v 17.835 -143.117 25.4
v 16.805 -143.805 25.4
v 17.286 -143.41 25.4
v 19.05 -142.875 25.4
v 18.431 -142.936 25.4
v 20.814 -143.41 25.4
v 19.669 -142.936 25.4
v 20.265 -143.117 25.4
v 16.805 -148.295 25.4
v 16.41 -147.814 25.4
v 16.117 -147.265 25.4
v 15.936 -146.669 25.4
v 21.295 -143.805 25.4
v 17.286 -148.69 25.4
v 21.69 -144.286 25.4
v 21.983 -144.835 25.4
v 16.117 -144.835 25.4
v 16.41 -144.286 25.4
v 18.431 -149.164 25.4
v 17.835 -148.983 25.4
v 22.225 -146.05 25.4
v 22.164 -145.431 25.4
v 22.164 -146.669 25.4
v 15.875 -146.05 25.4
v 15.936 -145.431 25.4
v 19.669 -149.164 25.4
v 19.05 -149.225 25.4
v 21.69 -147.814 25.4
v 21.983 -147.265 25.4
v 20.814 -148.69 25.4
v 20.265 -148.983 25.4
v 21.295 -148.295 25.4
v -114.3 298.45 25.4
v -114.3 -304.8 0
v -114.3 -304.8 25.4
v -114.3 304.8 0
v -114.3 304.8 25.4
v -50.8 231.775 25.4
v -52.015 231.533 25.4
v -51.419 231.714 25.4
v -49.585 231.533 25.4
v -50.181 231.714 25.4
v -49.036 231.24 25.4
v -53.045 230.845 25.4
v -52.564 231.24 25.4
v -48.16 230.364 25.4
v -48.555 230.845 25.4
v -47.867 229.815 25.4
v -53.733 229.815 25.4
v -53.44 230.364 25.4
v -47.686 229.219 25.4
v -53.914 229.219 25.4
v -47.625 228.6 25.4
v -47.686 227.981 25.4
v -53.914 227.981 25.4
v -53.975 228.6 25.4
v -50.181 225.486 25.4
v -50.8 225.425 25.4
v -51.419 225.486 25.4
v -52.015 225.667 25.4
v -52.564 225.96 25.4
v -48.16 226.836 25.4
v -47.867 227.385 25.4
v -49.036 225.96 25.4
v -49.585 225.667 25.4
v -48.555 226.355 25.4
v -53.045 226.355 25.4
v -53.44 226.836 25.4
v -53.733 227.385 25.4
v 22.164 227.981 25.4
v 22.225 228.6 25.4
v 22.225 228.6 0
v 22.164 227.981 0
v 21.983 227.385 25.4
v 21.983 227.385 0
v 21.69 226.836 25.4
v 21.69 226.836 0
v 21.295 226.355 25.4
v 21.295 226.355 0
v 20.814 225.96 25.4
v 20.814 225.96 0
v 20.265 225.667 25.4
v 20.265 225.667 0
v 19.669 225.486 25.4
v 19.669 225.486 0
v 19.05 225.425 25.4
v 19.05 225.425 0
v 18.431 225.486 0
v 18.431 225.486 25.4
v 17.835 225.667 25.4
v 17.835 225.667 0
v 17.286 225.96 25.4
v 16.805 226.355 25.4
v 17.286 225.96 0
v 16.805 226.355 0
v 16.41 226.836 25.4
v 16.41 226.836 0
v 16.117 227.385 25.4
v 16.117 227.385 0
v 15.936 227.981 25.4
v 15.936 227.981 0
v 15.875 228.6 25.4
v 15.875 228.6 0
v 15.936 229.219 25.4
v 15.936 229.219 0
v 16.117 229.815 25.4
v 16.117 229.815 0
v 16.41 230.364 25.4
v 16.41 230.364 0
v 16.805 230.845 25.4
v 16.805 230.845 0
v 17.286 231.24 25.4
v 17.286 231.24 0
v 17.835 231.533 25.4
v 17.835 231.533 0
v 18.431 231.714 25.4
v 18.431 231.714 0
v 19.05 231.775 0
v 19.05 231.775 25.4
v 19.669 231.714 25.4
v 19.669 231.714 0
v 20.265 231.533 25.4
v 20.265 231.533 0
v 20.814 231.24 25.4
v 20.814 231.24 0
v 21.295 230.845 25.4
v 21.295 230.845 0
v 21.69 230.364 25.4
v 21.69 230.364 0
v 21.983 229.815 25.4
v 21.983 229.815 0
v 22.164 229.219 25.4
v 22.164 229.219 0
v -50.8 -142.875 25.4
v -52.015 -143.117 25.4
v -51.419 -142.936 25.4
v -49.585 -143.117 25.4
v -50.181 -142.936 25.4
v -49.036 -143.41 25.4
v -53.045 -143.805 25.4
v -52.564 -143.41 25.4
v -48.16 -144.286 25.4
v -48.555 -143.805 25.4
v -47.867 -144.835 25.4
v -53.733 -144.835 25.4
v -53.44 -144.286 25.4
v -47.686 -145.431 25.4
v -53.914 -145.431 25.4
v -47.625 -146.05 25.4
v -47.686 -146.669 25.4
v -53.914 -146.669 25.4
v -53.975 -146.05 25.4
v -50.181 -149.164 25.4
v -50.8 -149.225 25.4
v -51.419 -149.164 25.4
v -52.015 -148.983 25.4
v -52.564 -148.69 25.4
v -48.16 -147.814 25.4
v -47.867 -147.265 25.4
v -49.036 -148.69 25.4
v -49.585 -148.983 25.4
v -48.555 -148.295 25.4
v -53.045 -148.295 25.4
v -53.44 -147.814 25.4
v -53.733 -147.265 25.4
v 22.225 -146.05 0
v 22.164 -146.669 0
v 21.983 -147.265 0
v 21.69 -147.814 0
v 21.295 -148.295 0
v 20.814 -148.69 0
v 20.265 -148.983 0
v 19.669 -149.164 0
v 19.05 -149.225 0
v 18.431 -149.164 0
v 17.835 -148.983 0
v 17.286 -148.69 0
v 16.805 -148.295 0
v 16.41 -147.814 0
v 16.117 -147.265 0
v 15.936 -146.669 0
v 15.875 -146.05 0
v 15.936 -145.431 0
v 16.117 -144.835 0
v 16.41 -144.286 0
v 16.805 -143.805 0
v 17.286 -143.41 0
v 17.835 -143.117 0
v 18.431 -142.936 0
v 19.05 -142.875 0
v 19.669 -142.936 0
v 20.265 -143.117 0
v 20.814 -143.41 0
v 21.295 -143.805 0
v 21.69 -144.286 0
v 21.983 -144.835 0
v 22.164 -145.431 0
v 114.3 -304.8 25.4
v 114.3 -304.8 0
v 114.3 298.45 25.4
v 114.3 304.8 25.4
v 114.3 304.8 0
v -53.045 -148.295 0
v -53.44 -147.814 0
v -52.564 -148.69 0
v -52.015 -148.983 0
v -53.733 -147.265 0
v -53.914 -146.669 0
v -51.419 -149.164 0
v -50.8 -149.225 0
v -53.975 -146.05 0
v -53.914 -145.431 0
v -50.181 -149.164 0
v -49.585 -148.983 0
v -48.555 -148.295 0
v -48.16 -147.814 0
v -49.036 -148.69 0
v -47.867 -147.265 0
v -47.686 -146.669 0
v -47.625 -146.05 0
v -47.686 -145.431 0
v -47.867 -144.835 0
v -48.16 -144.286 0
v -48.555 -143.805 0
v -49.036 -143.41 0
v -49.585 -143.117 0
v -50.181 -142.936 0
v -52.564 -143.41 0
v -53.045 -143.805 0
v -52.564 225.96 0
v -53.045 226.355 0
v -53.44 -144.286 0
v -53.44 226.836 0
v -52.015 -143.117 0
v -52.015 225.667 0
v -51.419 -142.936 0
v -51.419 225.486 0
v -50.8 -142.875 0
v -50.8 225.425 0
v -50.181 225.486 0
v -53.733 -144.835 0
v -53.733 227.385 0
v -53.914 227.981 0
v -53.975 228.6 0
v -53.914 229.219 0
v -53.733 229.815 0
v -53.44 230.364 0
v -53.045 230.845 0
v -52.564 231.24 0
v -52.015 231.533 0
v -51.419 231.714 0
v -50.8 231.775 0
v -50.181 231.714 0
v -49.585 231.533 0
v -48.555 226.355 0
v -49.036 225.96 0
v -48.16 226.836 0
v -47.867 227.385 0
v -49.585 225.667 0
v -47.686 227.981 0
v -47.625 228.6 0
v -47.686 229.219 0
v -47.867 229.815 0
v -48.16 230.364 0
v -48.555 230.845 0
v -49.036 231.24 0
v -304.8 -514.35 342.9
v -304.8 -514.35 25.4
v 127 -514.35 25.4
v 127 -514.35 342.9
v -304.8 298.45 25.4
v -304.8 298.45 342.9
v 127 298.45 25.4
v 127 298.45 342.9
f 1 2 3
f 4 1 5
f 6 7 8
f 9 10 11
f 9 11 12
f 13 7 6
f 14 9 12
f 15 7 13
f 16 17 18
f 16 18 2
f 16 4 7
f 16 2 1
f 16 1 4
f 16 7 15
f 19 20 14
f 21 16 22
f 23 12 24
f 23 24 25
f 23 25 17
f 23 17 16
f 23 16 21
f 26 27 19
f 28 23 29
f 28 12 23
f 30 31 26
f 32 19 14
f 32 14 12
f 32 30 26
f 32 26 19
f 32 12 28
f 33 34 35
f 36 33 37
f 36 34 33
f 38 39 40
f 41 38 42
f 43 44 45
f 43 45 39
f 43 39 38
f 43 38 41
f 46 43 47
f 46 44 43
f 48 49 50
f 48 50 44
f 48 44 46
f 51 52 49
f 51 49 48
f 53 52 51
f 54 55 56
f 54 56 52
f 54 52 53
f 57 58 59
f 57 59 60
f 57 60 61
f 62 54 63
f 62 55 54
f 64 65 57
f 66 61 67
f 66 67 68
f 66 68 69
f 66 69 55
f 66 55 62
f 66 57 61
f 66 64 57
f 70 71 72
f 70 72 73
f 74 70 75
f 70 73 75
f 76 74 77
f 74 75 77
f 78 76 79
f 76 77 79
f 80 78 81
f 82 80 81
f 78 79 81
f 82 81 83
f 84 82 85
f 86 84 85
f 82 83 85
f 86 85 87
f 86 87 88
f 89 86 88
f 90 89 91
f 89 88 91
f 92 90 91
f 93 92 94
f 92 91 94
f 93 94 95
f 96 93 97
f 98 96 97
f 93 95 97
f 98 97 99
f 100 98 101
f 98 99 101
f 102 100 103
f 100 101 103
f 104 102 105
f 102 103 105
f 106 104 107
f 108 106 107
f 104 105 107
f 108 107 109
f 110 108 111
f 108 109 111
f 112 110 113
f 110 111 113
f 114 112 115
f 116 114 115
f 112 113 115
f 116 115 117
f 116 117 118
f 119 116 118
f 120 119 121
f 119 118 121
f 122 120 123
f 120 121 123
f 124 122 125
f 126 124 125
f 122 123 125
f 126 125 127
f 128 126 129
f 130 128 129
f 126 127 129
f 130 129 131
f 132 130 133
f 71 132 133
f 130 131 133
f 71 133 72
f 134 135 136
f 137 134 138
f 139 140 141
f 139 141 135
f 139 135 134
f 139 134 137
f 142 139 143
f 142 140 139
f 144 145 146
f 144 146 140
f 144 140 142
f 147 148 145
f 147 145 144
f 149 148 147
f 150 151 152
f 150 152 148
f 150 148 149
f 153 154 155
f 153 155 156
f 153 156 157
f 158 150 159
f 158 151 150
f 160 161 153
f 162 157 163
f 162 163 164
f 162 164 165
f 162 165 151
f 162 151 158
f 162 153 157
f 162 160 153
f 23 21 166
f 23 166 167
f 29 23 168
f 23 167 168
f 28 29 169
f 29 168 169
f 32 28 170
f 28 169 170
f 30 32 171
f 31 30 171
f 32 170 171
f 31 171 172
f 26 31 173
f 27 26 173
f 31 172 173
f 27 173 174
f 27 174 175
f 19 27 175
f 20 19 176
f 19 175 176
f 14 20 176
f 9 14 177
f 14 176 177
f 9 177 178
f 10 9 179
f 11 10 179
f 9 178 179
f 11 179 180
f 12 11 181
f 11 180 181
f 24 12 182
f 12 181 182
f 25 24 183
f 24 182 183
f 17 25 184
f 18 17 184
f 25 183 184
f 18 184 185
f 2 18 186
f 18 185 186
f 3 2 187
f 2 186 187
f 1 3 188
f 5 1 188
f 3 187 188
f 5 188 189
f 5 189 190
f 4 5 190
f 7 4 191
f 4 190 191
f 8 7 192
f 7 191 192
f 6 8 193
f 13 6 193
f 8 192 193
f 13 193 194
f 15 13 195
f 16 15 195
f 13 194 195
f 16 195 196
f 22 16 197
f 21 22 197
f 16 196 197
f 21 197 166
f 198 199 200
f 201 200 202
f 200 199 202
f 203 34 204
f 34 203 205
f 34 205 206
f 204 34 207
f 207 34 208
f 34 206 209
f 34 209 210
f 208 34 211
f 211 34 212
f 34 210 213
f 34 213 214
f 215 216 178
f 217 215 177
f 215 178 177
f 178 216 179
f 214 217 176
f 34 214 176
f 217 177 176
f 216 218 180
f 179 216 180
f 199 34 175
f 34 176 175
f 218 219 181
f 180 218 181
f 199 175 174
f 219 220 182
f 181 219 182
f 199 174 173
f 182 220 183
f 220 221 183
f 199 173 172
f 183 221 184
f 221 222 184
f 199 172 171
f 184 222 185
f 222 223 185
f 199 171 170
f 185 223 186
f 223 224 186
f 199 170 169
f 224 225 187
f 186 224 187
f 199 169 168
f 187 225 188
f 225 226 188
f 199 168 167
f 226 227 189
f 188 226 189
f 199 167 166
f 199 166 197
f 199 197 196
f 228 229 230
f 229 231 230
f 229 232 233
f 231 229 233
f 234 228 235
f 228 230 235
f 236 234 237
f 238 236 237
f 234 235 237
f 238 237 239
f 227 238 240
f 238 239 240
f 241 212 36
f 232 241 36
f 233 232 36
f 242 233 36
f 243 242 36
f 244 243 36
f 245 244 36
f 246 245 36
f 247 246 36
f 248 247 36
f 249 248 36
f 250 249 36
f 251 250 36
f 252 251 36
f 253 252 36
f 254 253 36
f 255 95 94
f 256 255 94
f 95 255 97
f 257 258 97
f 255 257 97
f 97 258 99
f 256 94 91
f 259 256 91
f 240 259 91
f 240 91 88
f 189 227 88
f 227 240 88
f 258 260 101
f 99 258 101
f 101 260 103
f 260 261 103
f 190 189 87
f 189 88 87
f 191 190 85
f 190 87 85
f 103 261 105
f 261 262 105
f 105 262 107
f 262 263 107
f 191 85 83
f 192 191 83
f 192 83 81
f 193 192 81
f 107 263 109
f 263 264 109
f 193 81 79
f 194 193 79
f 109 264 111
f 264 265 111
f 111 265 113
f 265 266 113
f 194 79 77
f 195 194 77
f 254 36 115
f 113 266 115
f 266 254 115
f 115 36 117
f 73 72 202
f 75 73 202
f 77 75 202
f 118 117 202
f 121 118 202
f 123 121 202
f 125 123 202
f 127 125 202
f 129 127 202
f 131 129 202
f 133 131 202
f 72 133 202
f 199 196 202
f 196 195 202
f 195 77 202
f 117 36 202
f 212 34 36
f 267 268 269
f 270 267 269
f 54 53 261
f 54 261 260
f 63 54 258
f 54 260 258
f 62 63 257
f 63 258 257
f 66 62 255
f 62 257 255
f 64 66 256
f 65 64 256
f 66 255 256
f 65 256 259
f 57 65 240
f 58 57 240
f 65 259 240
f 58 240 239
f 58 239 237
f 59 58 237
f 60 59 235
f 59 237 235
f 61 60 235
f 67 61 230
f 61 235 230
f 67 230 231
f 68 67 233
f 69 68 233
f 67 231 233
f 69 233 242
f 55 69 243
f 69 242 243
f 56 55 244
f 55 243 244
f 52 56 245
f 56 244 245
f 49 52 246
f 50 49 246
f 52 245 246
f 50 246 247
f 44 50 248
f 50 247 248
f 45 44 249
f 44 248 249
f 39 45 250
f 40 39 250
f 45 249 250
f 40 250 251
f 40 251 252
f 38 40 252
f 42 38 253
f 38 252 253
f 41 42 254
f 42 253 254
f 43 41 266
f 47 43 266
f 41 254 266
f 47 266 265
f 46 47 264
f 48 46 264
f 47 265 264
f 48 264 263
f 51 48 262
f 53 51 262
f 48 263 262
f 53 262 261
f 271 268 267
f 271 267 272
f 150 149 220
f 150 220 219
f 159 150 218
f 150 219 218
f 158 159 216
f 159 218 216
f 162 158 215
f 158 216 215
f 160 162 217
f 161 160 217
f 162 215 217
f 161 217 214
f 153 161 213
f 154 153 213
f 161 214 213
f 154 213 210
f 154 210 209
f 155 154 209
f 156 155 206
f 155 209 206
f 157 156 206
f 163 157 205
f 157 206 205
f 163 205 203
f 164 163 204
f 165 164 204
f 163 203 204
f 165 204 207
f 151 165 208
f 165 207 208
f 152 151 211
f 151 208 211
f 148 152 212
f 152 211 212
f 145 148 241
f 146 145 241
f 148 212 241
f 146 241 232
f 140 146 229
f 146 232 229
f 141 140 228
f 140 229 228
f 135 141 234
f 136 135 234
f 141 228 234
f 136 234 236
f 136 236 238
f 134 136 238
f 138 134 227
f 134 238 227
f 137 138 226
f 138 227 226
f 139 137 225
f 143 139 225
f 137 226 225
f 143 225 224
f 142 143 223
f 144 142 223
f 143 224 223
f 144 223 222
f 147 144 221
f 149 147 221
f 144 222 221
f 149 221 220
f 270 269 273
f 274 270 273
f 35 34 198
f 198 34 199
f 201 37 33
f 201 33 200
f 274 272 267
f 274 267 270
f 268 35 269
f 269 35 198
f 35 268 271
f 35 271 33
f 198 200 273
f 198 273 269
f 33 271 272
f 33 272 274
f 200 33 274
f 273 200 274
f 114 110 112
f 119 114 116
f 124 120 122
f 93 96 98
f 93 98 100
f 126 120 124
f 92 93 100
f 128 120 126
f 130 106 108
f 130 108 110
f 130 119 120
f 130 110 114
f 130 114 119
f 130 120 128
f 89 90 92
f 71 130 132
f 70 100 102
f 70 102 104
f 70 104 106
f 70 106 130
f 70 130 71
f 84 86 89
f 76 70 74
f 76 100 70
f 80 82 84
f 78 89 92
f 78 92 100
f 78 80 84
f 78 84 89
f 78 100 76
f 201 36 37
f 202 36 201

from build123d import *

# Parameters (mm, degrees)
F0_W     = 228.6
F0_H     = 609.6
F1_DEPTH = 25.4
F2_W     = 431.8
F2_H     = 812.8
F3_DEPTH = 317.5
F4_R     = 3.175
F5_DEPTH = 25.4


with BuildPart() as f1:
    # F0 (on Top) → F1 (new body)
    with BuildSketch(Plane.XY):
        Rectangle(F0_W, F0_H)
    extrude(amount=F1_DEPTH)

    # F2 (on face) → F3 (join)
    with BuildSketch(Plane.XY.offset(25.4)):
        with Locations((-88.9, -107.95)):
            Rectangle(F2_W, F2_H)
    extrude(amount=F3_DEPTH)

    # F4 (on face) → F5 (cut)
    with BuildSketch(Plane(origin=(0, 0, 0), x_dir=(1, 0, 0), z_dir=(0, 0, -1))):
        with Locations((-50.8, -228.6)):
            Circle(F4_R)
        with Locations((19.05, -228.6)):
            Circle(F4_R)
        with Locations((-50.8, 146.05)):
            Circle(F4_R)
        with Locations((19.05, 146.05)):
            Circle(F4_R)
    extrude(amount=-F5_DEPTH, mode=Mode.SUBTRACT)


solid = f1.part
